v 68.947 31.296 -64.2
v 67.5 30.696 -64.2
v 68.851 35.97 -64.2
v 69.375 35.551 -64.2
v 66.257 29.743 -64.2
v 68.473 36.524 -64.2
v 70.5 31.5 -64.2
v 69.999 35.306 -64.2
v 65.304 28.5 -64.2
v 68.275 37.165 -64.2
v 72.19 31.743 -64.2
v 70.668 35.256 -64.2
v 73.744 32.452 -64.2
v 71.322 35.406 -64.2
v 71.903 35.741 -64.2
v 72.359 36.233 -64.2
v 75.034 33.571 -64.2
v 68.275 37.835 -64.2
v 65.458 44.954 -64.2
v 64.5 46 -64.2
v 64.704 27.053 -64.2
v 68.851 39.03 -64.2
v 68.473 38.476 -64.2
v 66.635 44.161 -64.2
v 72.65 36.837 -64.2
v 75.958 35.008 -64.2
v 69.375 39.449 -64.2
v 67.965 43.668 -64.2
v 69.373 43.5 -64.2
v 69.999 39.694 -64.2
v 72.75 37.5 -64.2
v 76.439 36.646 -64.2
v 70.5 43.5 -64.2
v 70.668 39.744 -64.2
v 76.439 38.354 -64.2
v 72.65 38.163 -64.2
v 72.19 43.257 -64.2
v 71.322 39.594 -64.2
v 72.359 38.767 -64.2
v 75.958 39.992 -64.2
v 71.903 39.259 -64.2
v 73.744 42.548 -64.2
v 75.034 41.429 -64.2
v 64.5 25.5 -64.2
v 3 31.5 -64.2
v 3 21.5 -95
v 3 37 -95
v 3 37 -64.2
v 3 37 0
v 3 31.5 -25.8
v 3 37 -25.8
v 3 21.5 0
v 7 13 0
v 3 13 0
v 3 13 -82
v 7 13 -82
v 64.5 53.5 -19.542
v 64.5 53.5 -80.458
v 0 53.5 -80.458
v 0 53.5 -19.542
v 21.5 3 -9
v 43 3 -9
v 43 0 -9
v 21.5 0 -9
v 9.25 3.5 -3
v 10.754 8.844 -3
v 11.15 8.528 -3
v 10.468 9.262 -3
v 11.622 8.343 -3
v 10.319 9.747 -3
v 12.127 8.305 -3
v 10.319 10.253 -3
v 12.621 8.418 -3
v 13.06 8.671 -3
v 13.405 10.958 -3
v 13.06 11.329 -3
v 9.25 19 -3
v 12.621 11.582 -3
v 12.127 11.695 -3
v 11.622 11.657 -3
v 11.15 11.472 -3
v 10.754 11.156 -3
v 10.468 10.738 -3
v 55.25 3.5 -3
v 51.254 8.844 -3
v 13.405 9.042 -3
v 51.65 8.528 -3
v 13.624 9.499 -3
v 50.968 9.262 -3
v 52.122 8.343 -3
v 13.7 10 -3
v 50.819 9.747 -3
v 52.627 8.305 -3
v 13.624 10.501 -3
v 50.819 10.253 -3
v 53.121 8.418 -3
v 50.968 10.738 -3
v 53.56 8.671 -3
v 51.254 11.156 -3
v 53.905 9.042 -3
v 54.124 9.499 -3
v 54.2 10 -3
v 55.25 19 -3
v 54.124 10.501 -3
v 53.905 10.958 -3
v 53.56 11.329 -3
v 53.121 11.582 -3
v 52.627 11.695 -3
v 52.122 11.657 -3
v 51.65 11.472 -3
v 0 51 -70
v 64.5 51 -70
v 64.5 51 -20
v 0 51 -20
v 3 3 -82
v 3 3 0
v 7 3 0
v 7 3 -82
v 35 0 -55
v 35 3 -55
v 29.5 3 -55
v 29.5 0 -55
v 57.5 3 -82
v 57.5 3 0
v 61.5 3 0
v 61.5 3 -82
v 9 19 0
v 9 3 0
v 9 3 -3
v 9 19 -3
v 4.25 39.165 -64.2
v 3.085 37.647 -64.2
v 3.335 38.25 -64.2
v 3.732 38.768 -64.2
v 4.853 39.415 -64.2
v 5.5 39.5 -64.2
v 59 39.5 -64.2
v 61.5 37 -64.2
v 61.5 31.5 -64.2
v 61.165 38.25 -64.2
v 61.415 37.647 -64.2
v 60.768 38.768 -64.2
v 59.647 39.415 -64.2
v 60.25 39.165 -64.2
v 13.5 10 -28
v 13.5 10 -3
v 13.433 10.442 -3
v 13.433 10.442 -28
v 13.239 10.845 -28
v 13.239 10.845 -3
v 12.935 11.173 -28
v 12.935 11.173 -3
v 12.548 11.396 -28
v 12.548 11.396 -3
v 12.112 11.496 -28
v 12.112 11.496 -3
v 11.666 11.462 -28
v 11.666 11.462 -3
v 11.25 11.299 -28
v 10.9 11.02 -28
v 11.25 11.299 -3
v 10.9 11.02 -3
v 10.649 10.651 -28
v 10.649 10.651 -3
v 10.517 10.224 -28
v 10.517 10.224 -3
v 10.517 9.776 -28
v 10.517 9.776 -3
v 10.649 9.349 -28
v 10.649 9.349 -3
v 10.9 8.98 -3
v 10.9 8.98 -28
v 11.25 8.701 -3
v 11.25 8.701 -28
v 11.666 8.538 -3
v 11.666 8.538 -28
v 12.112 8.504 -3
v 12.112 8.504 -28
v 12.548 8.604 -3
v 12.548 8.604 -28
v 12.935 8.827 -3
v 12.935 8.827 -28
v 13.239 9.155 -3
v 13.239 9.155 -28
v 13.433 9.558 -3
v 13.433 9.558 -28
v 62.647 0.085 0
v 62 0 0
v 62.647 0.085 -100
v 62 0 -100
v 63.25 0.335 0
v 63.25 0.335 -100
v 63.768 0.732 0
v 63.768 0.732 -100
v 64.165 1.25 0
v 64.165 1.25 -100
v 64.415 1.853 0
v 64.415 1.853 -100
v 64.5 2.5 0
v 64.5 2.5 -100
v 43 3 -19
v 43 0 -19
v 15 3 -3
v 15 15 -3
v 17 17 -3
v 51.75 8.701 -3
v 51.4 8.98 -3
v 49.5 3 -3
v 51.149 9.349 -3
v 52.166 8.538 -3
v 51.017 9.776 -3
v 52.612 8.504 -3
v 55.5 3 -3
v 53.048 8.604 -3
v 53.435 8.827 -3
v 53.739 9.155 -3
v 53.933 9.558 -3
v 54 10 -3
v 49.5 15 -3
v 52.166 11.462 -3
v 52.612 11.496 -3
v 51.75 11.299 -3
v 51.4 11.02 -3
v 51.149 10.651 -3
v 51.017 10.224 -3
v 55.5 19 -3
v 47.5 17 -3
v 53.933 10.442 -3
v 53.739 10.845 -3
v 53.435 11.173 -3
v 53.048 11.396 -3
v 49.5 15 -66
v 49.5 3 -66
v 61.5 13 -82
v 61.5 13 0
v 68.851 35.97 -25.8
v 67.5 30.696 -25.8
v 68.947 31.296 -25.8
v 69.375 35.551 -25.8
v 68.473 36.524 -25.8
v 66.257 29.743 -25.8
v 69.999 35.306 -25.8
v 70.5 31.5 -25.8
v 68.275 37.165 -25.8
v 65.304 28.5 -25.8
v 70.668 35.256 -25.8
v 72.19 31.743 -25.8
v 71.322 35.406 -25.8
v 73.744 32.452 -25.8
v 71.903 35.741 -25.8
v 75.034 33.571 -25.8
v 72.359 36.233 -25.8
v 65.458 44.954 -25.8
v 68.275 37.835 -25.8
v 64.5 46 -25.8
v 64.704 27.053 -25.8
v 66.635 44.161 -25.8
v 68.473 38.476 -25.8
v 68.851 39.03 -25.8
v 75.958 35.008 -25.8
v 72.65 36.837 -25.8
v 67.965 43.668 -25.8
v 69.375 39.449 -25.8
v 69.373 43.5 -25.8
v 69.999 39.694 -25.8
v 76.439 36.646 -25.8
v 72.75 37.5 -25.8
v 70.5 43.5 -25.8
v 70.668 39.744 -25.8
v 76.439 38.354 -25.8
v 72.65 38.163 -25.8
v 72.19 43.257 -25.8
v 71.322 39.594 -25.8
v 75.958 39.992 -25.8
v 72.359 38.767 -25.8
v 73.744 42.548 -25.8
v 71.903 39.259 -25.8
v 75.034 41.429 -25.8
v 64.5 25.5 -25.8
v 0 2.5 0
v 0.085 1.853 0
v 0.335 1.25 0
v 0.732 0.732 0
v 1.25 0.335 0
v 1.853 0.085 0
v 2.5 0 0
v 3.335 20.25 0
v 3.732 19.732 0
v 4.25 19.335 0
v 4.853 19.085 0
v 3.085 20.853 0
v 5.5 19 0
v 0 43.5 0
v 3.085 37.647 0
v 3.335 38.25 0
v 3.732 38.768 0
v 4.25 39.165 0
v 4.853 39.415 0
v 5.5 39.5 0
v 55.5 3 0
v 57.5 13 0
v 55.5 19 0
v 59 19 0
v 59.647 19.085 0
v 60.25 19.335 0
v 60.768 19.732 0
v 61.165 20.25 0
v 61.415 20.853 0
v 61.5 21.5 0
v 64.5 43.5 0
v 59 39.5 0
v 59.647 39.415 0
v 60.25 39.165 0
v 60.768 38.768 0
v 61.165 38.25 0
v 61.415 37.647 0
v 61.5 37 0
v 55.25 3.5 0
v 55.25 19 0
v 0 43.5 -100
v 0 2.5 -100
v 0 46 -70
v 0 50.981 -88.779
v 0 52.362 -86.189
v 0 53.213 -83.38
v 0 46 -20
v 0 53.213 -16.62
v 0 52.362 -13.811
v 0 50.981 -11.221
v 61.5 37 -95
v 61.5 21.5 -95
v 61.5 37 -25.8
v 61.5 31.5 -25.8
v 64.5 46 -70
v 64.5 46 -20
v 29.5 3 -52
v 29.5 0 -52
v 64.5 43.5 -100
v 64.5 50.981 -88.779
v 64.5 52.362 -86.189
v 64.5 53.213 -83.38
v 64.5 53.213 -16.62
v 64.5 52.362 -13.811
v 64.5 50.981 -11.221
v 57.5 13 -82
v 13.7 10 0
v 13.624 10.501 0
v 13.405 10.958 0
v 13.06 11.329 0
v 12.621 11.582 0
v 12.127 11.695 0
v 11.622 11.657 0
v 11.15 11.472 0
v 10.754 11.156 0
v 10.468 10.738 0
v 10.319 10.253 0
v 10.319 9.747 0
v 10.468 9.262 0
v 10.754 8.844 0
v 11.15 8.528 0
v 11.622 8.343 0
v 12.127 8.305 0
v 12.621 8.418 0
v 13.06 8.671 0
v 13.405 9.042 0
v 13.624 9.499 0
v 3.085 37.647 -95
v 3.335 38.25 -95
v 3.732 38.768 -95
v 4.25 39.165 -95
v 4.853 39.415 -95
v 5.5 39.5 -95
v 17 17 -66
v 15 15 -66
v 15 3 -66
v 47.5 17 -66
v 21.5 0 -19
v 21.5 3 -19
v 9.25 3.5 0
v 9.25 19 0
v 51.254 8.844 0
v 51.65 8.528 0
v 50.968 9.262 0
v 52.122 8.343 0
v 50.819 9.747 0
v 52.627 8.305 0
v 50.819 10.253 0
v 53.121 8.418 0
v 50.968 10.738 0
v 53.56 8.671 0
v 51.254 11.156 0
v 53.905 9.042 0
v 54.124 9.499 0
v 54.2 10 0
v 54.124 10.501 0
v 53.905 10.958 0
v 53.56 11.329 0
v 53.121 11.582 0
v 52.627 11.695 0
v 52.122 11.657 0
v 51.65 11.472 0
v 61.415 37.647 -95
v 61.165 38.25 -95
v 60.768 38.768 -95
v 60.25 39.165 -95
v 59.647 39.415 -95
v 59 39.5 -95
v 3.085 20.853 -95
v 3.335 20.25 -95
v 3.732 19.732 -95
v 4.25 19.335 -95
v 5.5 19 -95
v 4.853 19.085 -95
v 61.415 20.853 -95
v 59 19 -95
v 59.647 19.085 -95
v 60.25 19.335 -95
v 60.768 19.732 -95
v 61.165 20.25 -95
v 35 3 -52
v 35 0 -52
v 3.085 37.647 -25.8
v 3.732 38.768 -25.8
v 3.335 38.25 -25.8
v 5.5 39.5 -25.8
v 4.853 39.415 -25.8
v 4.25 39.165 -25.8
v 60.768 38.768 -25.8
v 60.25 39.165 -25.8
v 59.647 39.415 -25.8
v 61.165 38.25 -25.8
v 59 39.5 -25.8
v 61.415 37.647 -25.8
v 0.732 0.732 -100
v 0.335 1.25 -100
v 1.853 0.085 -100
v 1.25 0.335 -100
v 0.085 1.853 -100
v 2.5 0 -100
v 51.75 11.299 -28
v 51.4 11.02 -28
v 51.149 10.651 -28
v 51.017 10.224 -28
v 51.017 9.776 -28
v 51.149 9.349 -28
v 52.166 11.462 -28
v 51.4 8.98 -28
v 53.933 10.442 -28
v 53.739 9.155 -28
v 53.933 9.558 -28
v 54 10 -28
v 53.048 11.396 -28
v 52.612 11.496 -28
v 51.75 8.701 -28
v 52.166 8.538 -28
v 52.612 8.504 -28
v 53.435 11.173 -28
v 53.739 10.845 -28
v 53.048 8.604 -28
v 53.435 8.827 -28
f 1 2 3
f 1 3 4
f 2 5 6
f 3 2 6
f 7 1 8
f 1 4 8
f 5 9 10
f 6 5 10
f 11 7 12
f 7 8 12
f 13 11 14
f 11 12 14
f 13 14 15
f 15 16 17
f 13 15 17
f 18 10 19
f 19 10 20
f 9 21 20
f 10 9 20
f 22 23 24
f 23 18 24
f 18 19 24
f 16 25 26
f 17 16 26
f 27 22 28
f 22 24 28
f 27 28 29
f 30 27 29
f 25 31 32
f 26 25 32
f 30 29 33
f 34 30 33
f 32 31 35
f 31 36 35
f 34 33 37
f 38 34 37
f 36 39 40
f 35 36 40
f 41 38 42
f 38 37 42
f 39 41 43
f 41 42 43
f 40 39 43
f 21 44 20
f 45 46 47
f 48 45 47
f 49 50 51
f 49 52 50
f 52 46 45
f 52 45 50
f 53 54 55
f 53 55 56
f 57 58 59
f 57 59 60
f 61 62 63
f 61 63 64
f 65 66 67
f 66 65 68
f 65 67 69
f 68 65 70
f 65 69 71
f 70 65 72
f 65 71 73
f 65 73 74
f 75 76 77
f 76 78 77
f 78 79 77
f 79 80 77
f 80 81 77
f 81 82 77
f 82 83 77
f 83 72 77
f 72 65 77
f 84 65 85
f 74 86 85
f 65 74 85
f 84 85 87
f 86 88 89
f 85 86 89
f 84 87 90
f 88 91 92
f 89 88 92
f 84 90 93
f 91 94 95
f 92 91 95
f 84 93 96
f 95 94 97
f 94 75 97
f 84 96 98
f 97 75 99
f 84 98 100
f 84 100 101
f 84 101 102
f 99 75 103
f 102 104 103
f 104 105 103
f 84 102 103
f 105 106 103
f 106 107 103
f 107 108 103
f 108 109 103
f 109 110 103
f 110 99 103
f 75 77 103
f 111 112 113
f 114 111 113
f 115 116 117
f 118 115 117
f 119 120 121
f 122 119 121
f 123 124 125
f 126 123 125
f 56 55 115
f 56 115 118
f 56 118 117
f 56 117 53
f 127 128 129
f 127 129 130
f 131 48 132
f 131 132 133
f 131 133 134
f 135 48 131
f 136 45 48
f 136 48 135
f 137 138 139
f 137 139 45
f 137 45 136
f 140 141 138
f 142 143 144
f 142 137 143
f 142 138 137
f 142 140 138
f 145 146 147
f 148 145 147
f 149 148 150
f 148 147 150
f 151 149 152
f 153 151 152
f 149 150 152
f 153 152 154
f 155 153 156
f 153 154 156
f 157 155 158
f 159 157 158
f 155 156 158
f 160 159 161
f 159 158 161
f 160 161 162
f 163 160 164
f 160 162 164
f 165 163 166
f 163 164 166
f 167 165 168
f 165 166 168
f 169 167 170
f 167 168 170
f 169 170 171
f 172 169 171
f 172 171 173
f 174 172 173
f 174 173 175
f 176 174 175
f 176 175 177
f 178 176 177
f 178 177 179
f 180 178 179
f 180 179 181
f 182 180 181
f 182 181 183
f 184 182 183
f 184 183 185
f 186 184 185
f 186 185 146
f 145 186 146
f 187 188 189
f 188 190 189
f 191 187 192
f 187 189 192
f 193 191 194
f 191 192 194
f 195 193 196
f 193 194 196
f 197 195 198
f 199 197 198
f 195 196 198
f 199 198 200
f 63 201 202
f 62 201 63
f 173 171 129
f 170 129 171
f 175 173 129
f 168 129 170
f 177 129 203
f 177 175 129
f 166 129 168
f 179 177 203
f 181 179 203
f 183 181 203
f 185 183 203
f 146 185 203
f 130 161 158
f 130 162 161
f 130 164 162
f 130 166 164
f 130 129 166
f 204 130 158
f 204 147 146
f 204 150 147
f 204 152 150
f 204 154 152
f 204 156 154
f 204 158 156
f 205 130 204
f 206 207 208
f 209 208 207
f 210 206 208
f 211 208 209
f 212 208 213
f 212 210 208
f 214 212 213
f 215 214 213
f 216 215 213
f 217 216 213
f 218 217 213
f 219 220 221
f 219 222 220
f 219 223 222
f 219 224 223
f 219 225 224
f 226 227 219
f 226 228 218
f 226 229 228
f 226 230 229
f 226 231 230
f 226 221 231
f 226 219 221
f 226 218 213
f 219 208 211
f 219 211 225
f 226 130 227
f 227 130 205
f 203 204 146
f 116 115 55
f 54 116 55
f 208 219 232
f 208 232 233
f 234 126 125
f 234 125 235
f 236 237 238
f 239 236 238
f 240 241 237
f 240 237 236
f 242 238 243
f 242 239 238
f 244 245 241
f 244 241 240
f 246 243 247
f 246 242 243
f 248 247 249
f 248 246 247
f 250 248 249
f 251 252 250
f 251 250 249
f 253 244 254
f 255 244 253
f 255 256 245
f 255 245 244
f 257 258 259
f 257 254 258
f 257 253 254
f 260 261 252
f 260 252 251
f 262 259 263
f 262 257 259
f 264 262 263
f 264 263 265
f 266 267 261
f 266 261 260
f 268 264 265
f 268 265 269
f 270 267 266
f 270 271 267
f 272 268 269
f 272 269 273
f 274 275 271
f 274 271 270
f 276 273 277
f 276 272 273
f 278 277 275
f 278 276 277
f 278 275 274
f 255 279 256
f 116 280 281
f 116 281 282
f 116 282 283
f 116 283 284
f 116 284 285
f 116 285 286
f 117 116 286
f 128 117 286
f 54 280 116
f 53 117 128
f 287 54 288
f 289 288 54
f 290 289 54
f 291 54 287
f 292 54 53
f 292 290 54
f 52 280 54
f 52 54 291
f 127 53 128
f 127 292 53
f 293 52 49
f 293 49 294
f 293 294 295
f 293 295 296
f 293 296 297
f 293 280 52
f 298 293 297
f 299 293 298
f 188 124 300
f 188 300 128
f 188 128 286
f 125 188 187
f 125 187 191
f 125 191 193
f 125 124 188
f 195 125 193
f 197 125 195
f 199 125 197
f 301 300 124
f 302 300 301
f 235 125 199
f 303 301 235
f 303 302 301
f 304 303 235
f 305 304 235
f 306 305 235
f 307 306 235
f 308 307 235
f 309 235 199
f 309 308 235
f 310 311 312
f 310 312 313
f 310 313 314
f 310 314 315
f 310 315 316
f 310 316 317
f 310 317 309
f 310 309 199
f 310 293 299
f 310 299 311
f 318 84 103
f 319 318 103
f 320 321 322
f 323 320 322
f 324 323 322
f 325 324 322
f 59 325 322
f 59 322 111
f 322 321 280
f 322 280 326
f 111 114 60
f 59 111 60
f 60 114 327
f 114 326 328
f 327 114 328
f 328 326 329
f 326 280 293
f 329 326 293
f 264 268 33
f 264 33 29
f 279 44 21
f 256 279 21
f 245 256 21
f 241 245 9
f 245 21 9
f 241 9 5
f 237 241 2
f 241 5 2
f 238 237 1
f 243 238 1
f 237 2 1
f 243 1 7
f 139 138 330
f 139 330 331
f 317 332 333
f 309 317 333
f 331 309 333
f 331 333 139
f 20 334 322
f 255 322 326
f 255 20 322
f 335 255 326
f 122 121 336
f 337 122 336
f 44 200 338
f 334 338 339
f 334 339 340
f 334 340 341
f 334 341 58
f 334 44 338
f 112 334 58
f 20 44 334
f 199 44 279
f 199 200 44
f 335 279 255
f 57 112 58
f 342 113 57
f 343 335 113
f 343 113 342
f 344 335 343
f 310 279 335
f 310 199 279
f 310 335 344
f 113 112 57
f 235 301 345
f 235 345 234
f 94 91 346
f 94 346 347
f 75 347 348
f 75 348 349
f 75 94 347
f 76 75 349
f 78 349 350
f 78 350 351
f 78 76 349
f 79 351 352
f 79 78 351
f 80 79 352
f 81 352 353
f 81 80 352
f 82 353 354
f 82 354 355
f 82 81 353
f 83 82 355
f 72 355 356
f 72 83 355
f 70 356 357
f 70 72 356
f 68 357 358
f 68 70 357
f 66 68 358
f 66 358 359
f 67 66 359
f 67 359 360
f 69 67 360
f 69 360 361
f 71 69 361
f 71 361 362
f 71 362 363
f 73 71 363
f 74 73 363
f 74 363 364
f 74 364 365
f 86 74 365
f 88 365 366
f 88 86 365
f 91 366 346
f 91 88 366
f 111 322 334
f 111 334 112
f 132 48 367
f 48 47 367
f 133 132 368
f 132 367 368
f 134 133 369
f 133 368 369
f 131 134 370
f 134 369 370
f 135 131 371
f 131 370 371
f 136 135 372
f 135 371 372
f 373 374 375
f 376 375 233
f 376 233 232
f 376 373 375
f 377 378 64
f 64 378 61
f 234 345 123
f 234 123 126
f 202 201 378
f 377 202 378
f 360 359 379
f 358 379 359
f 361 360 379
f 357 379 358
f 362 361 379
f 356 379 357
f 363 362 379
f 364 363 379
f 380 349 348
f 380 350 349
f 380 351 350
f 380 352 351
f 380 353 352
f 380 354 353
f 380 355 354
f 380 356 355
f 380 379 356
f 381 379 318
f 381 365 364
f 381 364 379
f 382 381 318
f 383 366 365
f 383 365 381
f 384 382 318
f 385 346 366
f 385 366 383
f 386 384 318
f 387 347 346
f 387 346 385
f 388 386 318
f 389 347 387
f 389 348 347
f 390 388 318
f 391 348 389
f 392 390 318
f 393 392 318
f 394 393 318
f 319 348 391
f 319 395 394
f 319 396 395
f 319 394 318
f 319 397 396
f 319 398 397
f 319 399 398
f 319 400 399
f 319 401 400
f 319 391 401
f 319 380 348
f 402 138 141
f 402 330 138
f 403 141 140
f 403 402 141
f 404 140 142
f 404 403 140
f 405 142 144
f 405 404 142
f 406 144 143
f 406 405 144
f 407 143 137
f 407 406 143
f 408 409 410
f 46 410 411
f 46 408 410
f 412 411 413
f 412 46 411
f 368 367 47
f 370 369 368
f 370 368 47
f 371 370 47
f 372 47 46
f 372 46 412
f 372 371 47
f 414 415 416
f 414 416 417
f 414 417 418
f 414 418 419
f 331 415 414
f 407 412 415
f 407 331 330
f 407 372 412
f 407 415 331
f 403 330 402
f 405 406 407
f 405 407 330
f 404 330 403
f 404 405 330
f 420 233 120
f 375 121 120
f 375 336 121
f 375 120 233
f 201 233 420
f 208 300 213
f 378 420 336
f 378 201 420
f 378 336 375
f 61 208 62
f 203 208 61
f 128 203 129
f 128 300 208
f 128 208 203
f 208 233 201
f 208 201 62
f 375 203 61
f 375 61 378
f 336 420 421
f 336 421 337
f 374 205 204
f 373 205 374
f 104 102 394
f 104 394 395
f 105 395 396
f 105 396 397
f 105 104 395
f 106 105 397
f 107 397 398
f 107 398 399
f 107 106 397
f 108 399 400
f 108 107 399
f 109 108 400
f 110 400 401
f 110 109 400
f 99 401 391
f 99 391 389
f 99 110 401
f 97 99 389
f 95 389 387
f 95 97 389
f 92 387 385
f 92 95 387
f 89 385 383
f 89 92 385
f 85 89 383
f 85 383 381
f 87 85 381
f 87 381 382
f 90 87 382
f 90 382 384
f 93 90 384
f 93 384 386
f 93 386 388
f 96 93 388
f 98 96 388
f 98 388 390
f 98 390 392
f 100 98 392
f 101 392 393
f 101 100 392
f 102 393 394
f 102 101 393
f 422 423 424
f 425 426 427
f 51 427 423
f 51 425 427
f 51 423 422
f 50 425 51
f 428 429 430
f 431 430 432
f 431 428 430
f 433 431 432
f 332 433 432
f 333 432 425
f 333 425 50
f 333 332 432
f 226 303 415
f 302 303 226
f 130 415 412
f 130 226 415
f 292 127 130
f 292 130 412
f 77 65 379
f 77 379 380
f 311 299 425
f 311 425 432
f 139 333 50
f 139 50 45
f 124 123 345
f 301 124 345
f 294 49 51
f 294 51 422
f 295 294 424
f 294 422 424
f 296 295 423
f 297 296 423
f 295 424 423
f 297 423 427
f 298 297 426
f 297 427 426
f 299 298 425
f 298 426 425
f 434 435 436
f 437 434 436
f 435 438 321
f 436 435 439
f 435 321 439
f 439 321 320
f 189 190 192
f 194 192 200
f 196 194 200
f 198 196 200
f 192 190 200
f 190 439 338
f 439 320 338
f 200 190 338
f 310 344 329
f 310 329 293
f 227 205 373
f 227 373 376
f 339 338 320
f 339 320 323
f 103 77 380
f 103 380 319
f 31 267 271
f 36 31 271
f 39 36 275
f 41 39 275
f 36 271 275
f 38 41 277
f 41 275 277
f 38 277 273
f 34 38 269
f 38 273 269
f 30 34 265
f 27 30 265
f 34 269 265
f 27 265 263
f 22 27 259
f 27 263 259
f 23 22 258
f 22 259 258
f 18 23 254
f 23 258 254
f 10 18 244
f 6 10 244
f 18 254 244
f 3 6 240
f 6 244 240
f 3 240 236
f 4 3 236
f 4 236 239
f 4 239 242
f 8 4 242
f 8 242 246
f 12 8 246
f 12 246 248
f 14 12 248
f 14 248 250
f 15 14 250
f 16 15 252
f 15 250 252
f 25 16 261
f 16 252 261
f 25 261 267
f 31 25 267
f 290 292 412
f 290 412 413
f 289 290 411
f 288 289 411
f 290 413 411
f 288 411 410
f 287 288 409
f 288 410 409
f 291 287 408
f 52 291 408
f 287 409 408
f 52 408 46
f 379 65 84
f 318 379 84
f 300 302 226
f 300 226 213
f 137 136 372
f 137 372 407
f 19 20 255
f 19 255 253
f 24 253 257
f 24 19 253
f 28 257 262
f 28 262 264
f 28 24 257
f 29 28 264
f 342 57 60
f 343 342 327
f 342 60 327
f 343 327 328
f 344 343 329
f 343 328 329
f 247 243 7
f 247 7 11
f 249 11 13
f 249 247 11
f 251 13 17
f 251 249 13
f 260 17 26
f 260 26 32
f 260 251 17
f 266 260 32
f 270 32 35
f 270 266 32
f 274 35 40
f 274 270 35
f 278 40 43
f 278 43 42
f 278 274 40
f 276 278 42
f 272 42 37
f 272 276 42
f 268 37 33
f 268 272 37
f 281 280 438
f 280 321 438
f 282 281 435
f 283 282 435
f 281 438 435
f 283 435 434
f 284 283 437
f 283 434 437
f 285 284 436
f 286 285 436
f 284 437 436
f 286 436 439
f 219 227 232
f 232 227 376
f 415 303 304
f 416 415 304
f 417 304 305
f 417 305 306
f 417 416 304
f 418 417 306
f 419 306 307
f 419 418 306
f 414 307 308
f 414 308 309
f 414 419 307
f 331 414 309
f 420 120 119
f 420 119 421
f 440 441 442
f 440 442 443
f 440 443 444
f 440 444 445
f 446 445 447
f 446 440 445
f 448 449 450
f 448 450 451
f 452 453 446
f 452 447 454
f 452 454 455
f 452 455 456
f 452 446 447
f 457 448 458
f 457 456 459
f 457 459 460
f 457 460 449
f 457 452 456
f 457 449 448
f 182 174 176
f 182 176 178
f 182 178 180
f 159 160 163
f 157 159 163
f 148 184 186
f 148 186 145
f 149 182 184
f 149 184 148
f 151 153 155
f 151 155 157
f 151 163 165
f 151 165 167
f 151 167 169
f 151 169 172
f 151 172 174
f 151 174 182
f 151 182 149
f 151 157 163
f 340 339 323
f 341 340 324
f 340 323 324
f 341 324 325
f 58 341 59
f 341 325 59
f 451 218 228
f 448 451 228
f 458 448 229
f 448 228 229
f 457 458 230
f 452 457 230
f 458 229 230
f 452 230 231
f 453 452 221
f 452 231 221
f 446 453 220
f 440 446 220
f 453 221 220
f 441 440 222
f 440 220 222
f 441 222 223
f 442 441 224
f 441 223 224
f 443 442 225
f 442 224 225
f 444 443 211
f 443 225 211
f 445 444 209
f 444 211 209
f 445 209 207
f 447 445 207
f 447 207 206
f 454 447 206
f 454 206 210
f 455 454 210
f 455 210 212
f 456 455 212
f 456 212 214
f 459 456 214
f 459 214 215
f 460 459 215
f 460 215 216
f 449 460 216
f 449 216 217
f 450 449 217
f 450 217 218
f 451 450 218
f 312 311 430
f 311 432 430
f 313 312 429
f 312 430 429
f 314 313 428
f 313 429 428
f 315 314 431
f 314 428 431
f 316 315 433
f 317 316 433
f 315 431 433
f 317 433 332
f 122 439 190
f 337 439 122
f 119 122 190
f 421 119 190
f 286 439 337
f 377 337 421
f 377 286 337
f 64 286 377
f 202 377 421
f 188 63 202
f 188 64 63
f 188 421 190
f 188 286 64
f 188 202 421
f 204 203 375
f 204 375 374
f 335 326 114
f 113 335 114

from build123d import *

# Parameters (mm, degrees)
F0_W         = 4
F0_H         = 10
F1_DEPTH     = 100
F2_START     = -3
F0_R         = 1.5
F2_DEPTH     = 97
F3_START     = -28
F3_DEPTH     = 72
F4_START     = -95
F4_DEPTH     = 5
F5_START     = -66
F0_W_2       = 34.5
F0_H_2       = 14
F5_DEPTH     = 34
F6_START     = -25.8
F0_R_2       = 3.75
F0_R_3       = 2.25
F6_DEPTH     = 38.4
F7_START     = -82
F7_DEPTH     = 18
F8_W         = 5
F8_H         = 50
F9_DEPTH     = 64.5
F10_W        = 46
F10_H        = 15.5
F10_R        = 1.7
F11_DEPTH    = 3
F12_W        = 21.5
F12_H        = 10
F12_W_2      = 5.5
F12_H_2      = 3
F13_DEPTH    = 3
F14_R        = 2.5
F15_R        = 2.5
F16_T1_DEPTH = 38.4
F17_R        = 15
F18_SIZE     = 2


# Not quite as in the source:
# - a fillet or chamfer that OpenCascade refuses, or shapes differently, is made with other operations: its cross-section is extruded or revolved along the edge and cut away or added


with BuildPart() as f1:
    # F0 (on Top) → F1 (new body)
    with BuildSketch(Plane.XY):
        Polygon((64.5, 43.5), (0, 43.5), (0, 31.5), (0, 0), (64.5, 0), (64.5, 31.5), align=None)
        with Locations((5, 8)):
            Rectangle(F0_W, F0_H, mode=Mode.SUBTRACT)
        with Locations((59.5, 8)):
            Rectangle(F0_W, F0_H, mode=Mode.SUBTRACT)
        Polygon((9, 19), (3, 19), (3, 39.5), (61.5, 39.5), (61.5, 19), (55.5, 19), (55.5, 3), (49.5, 3), (15, 3), (9, 3), align=None, mode=Mode.SUBTRACT)
    extrude(amount=-F1_DEPTH)

    # F0 (on Top) → F2 (join)
    with BuildSketch(Plane.XY.offset(F2_START)):
        Polygon((55.5, 19), (9, 19), (9, 3), (15, 3), (15, 17), (49.5, 17), (49.5, 3), (55.5, 3), align=None)
        with Locations((12, 10)):
            Circle(F0_R, mode=Mode.SUBTRACT)
        with Locations((52.5, 10)):
            Circle(F0_R, mode=Mode.SUBTRACT)
    extrude(amount=-F2_DEPTH)

    # F0 (on Top) → F3 (join)
    with BuildSketch(Plane.XY.offset(F3_START)):
        with Locations((52.5, 10)):
            Circle(F0_R)
        with Locations((12, 10)):
            Circle(F0_R)
    extrude(amount=-F3_DEPTH)

    # F0 (on Top) → F4 (join)
    with BuildSketch(Plane.XY.offset(F4_START)):
        Polygon((3, 39.5), (3, 19), (9, 19), (55.5, 19), (61.5, 19), (61.5, 39.5), align=None)
    extrude(amount=-F4_DEPTH)

    # F0 (on Top) → F5 (join)
    with BuildSketch(Plane.XY.offset(F5_START)):
        with Locations((32.25, 10)):
            Rectangle(F0_W_2, F0_H_2)
    extrude(amount=-F5_DEPTH)

    # F0 (on Top) → F6 (join)
    with BuildSketch(Plane.XY.offset(F6_START)):
        with BuildLine():
            Line((70.5, 43.5), (64.5, 43.5))
            Line((64.5, 43.5), (64.5, 31.5))
            Line((64.5, 31.5), (70.5, 31.5))
            ThreePointArc((70.5, 31.5), (76.5, 37.5), (70.5, 43.5))
        make_face()
        with Locations((70.5, 37.5)):
            Circle(F0_R_2, mode=Mode.SUBTRACT)
        with Locations((70.5, 37.5)):
            Circle(F0_R_2)
        with Locations((70.5, 37.5)):
            Circle(F0_R_3, mode=Mode.SUBTRACT)
    extrude(amount=-F6_DEPTH)

    # F0 (on Top) → F7 (join)
    with BuildSketch(Plane.XY.offset(F7_START)):
        with Locations((5, 8)):
            Rectangle(F0_W, F0_H)
        with Locations((59.5, 8)):
            Rectangle(F0_W, F0_H)
    extrude(amount=-F7_DEPTH)

    # F8 (on face) → F9 (join, through all)
    with BuildSketch(Plane.YZ.offset(64.5)):
        Polygon((53.5, -15), (43.5, 0), (43.5, -25.8), (31.5, -25.8), (31.5, -64.2), (43.5, -64.2), (43.5, -100), (53.5, -85), align=None)
        with Locations((48.5, -45)):
            Rectangle(F8_W, F8_H, mode=Mode.SUBTRACT)
    extrude(amount=-F9_DEPTH)

    # F12 (on face) → F13 (cut, through all)
    with BuildSketch(Plane(origin=(0, 3, 0), x_dir=(-1, 0, 0), z_dir=(0, 1, 0))):
        with Locations((-32.25, -14)):
            Rectangle(F12_W, F12_H)
        with Locations((-32.25, -53.5)):
            Rectangle(F12_W_2, F12_H_2)
    extrude(amount=-F13_DEPTH, mode=Mode.SUBTRACT)

    # F14
    f14_edges = [f1.edges().sort_by_distance(p)[0] for p in [
        (3, 39.5, -12.9),
        (3, 39.5, -79.6),
        (61.5, 39.5, -12.9),
        (61.5, 39.5, -79.6),
        (61.5, 19, -47.5),
        (3, 19, -47.5),
    ]]
    fillet(f14_edges, radius=F14_R)

    # F15
    f15_edges = [f1.edges().sort_by_distance(p)[0] for p in [
        (0, 0, -50),
        (64.5, 0, -50),
    ]]
    fillet(f15_edges, radius=F15_R)

    # F16: fillet of radius 6 on 2 edges, made by hand

    # F16_s2 → F16_t1 (join)
    with BuildSketch(Plane.XY.offset(-64.2)):
        with BuildLine():
            ThreePointArc((64.5, 25.5), (66.2573593129, 29.7426406871), (70.5, 31.5))
            Line((70.5, 31.5), (64.5, 31.5))
            Line((64.5, 31.5), (64.5, 25.5))
        make_face()
        with BuildLine():
            ThreePointArc((64.5, 46), (66.6347843849, 44.161460874), (69.3733971724, 43.5))
            Line((69.3733971724, 43.5), (64.5, 43.5))
            Line((64.5, 43.5), (64.5, 46))
        make_face()
    extrude(amount=F16_T1_DEPTH)

    # F17
    f17_edges = [f1.edges().sort_by_distance(p)[0] for p in [
        (32.25, 53.5, -15),
        (32.25, 53.5, -85),
    ]]
    fillet(f17_edges, radius=F17_R)

    # F18
    f18_edges = [f1.edges().sort_by_distance(p)[0] for p in [
        (15, 17, -34.5),
        (49.5, 17, -34.5),
    ]]
    chamfer(f18_edges, length=F18_SIZE)


with BuildPart() as f11:
    # F10 (on face) → F11 (new body, through all)
    with BuildSketch(Plane.XY.offset(-3)):
        with Locations((32.25, 11.25)):
            Rectangle(F10_W, F10_H)
        with Locations((12, 10)):
            Circle(F10_R, mode=Mode.SUBTRACT)
        with Locations((52.5, 10)):
            Circle(F10_R, mode=Mode.SUBTRACT)
    extrude(amount=F11_DEPTH)


solid = Compound([f1.part, f11.part])
